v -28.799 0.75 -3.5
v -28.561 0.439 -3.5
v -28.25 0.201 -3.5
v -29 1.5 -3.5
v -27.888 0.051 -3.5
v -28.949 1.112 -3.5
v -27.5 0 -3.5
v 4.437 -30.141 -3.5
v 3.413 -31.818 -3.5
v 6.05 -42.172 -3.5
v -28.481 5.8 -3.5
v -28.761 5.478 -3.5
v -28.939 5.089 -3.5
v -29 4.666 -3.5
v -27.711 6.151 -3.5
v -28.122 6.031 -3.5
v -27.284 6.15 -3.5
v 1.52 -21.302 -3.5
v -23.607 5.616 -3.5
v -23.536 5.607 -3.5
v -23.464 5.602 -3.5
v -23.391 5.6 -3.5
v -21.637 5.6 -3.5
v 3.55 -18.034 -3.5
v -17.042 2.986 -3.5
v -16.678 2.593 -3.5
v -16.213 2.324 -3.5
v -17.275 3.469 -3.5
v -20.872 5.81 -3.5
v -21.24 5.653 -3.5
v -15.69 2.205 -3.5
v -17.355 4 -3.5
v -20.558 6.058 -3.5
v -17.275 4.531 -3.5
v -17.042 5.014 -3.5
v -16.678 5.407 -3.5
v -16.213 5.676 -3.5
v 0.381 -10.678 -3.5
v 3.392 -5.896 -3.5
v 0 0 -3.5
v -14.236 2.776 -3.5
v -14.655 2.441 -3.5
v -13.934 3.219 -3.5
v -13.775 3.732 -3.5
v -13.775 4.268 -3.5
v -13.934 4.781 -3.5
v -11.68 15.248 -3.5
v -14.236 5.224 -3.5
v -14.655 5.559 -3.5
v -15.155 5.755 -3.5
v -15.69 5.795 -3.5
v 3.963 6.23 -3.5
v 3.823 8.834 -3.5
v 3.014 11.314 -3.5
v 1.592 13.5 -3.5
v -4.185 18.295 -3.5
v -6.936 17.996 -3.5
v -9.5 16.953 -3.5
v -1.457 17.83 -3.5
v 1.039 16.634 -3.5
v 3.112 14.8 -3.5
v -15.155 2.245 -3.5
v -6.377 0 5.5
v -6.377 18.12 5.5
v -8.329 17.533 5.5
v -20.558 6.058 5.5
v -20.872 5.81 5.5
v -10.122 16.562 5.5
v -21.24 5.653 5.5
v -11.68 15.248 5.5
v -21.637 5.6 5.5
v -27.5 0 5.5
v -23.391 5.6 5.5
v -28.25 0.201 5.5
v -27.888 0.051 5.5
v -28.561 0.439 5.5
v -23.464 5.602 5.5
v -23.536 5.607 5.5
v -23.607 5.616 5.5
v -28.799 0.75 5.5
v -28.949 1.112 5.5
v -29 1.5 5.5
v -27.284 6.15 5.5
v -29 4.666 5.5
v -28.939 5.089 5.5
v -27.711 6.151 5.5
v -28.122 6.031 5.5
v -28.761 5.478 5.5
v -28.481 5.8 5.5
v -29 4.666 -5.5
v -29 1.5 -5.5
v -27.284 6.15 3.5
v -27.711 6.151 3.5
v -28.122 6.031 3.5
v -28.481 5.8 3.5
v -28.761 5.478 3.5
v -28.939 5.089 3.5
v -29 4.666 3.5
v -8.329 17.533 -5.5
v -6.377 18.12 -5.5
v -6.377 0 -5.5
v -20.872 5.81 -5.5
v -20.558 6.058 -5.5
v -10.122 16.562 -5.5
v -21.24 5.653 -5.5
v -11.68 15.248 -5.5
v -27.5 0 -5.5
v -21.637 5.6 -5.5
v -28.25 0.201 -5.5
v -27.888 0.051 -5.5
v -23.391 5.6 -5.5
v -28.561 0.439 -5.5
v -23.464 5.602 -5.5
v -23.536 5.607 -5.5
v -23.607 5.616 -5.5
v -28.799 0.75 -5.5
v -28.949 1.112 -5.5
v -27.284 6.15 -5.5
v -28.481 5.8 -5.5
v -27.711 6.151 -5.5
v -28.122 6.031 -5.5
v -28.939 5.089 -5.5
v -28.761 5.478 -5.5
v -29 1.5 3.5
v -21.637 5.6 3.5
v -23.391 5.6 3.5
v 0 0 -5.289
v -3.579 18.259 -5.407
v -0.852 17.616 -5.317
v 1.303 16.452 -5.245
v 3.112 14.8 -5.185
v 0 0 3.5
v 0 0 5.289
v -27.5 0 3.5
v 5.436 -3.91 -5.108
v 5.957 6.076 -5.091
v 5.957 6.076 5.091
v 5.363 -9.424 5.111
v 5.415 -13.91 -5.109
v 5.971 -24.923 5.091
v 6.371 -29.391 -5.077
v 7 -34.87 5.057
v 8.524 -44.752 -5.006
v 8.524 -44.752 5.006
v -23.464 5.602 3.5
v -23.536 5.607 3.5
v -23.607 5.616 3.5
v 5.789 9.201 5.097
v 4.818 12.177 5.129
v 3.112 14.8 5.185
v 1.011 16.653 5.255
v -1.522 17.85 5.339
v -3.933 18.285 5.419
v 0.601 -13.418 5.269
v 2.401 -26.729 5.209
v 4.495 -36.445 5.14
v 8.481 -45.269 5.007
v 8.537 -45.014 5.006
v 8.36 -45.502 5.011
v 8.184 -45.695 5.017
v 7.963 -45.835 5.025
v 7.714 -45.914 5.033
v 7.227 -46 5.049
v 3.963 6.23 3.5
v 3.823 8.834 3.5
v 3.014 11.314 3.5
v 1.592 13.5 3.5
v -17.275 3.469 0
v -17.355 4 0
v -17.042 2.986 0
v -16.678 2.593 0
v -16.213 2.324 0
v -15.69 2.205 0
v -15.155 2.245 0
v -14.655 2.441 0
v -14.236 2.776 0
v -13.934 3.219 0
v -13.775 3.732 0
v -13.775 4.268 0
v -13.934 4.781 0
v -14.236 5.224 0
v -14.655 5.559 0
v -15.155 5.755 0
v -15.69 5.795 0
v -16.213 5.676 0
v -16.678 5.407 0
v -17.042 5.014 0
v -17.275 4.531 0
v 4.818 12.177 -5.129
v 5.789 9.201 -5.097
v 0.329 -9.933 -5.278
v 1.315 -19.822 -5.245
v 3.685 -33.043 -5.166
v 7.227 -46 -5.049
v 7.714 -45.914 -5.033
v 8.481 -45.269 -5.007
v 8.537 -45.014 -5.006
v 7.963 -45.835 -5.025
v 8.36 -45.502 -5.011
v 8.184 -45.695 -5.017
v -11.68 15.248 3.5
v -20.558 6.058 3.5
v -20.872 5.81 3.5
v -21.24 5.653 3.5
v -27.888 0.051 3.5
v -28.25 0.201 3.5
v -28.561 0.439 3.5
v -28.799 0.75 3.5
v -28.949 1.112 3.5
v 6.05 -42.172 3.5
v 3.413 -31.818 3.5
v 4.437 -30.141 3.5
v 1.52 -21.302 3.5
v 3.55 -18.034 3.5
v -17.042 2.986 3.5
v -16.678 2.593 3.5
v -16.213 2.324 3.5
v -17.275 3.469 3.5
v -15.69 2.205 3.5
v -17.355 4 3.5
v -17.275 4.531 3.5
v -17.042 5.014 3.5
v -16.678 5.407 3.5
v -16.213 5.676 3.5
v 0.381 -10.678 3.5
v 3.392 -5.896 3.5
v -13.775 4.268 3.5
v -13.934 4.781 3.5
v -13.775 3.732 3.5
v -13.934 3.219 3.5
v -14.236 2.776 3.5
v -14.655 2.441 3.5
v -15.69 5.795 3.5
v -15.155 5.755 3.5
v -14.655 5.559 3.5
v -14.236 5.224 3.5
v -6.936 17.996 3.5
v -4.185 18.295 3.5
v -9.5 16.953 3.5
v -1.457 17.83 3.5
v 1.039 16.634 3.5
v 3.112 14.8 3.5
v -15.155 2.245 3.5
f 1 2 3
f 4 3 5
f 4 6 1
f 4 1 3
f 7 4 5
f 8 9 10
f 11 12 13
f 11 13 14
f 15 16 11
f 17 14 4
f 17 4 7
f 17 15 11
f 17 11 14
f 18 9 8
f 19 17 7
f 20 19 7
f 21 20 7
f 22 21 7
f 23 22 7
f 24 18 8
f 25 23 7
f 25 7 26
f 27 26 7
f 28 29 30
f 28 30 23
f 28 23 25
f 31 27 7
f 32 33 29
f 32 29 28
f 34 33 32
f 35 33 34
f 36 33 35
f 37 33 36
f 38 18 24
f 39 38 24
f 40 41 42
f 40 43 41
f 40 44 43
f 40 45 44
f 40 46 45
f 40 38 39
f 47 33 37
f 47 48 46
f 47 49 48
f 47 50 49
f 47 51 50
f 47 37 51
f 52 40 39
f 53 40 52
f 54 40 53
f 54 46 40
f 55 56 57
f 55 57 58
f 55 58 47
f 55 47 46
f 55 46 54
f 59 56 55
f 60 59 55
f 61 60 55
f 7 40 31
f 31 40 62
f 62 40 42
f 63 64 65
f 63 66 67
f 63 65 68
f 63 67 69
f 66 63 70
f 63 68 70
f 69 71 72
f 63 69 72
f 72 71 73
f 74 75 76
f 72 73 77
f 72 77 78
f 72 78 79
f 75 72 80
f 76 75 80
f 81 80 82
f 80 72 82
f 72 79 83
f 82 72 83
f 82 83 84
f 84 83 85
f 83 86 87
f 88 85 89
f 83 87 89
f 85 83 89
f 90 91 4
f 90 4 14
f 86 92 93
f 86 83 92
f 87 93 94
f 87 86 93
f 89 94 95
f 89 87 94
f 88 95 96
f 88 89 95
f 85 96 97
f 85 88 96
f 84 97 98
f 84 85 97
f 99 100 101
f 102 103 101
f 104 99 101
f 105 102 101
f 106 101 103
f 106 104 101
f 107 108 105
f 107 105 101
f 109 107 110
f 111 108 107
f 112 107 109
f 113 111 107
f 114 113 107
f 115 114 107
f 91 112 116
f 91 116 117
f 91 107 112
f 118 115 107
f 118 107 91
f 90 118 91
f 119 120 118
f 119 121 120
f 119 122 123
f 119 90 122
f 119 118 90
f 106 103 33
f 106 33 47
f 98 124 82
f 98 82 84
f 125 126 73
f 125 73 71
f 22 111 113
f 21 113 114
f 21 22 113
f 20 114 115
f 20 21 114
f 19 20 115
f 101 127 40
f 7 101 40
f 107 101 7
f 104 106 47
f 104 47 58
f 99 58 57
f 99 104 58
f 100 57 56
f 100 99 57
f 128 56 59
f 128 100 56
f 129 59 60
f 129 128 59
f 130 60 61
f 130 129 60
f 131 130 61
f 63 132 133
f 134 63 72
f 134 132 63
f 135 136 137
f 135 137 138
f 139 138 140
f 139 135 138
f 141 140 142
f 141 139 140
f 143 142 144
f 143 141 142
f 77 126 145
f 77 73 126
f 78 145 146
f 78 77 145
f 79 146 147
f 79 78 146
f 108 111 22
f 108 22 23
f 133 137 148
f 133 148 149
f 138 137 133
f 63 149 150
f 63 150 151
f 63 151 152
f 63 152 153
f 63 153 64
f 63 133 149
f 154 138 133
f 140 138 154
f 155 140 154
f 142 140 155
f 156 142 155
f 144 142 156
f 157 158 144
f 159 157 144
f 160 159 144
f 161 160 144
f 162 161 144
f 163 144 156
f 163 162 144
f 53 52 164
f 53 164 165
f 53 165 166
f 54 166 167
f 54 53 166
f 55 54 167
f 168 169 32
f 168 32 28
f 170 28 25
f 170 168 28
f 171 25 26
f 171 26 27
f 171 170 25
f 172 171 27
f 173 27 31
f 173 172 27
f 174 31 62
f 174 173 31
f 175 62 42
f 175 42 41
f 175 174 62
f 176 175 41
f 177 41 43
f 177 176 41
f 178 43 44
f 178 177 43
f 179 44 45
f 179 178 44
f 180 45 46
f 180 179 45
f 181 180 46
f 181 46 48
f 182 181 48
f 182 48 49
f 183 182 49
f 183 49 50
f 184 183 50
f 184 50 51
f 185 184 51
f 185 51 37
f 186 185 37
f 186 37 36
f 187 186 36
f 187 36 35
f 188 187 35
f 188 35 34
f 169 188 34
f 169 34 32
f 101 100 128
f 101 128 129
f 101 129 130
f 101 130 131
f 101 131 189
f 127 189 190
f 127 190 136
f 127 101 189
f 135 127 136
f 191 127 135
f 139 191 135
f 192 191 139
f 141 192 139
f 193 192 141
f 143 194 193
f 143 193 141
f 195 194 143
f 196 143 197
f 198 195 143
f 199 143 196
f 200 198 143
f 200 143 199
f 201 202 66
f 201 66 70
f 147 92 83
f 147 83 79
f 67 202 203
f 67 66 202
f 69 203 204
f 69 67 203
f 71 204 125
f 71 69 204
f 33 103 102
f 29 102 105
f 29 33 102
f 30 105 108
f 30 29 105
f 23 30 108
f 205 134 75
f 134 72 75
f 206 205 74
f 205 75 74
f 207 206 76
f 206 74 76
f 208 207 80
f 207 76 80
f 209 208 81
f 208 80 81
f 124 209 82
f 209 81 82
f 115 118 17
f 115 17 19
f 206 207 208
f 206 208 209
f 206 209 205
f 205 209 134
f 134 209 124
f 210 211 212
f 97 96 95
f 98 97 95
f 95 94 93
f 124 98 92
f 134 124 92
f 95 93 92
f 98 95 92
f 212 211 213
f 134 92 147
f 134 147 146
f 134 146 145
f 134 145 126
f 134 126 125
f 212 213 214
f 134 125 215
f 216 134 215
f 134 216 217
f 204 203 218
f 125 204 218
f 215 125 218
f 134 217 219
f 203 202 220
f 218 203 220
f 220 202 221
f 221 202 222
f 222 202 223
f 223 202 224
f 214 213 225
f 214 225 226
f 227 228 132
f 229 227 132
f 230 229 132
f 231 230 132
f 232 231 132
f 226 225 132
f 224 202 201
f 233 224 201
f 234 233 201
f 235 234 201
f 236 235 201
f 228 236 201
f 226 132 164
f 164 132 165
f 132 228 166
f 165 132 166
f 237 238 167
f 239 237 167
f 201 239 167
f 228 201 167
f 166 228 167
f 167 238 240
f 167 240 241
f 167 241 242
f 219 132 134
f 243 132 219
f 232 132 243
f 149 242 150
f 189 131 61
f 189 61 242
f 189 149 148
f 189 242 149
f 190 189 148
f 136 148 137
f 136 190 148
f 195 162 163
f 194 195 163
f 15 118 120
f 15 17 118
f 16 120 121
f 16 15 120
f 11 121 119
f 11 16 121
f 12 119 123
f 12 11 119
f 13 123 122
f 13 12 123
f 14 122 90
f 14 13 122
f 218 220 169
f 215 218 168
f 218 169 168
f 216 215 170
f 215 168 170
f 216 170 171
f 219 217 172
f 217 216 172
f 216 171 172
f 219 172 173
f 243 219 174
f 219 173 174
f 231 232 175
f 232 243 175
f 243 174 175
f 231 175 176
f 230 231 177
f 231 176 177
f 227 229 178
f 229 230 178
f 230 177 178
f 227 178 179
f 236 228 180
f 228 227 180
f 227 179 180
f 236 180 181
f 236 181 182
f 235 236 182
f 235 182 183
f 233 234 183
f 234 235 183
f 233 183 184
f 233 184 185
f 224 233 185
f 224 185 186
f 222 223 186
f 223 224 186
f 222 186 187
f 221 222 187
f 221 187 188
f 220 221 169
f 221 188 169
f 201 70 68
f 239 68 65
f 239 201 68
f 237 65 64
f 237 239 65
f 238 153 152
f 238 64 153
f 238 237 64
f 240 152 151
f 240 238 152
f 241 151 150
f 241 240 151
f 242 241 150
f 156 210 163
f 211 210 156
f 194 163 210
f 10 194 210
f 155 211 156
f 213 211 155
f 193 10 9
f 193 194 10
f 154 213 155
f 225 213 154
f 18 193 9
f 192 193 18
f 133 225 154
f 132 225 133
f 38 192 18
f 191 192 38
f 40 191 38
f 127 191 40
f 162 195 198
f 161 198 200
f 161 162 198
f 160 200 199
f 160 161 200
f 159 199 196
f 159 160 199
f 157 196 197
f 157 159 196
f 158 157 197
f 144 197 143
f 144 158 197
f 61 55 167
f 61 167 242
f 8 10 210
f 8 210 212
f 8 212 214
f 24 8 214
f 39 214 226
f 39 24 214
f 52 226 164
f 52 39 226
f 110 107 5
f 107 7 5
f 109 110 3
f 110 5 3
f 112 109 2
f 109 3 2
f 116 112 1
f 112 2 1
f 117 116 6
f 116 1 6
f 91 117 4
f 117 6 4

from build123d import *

# Parameters (mm, degrees)
BOSS_EXTRUDE1_DEPTH             = 5.5
BOSS_EXTRUDE1_DEPTH_BACK        = 5.5
SHELL4_START                    = -3.5
SHELL4_DEPTH                    = 7
CUT_EXTRUDE1_DEPTH              = 55.655740778
CUT_EXTRUDE1_DEPTH_BACK         = 55.655740778
SKETCH2_W                       = 69.221398806
SKETCH2_H                       = 30.475534722
BOSS_EXTRUDE2_REACH             = 56.656
SKETCH3_R                       = 1.8
BOSS_EXTRUDE2_DIRECTION_2_REACH = 56.656
FILLET1_R                       = 1.5
FILLET2_R                       = 1


# Read off the part's stored shape, not the designer's step: Shell4
with BuildPart() as part:
    # Sketch1 → Boss-Extrude1 (new, two sides: drawn at the far end of the back side and taken through both)
    with BuildSketch(Plane.XY.offset(-BOSS_EXTRUDE1_DEPTH_BACK)):
        with BuildLine():
            Line((0, 0), (-29, 0))
            Line((-29, 0), (-29, 6.4))
            Line((-29, 6.4), (-23.5, 5.6))
            Line((-23.5, 5.6), (-21, 5.6))
            Line((-21, 5.6), (-11.679922193, 15.24784279))
            ThreePointArc((-11.679922193, 15.24784279), (-4.185109089, 18.295419669), (3.11160179, 14.8))
            ThreePointArc((3.11160179, 14.8), (5.40105274, 10.720543521), (5.956739646, 6.07567938))
            ThreePointArc((5.956739646, 6.07567938), (5.643205462, -19.921417521), (8.704665249, -45.739527733))
            Line((8.704665249, -45.739527733), (7.227453619, -46))
            ThreePointArc((7.227453619, -46), (1.817879019, -23.282161013), (0, 0))
        make_face()
    extrude(amount=BOSS_EXTRUDE1_DEPTH + BOSS_EXTRUDE1_DEPTH_BACK)

    # Shell4 outline → Shell4 (cut)
    with BuildSketch(Plane.XY.offset(SHELL4_START)):
        with BuildLine():
            Line((1.591733374, 13.5), (3.11160179, 14.8))
            ThreePointArc((3.11160179, 14.8), (-4.185109088, 18.295419669), (-11.679922193, 15.24784279))
            Line((-11.679922193, 15.24784279), (-21, 5.6))
            Line((-21, 5.6), (-23.5, 5.6))
            Line((-23.5, 5.6), (-29, 6.4))
            Line((-29, 6.4), (-29, 0))
            Line((-29, 0), (0, 0))
            ThreePointArc((0, 0), (1.520272061, -21.301887027), (6.050271879, -42.171978539))
            ThreePointArc((6.050271879, -42.171978539), (3.550168012, -18.033934193), (3.962681588, 6.229732817))
            ThreePointArc((3.962681588, 6.229732817), (3.499609166, 10.100452934), (1.591733374, 13.5))
        make_face()
    extrude(amount=SHELL4_DEPTH, mode=Mode.SUBTRACT)

    # Sketch2 → Cut-Extrude1 (cut, two sides: drawn at the far end of the back side and taken through both)
    with BuildSketch(Plane(origin=(0, 0, 0), x_dir=(1, 0, 0), z_dir=(0, 1, 0)).offset(-CUT_EXTRUDE1_DEPTH_BACK)):
        Rectangle(SKETCH2_W, SKETCH2_H)
        Polygon((-29, 6.25), (8.704665249, 5), (8.704665249, -5), (-29, -6.25), align=None, mode=Mode.SUBTRACT)
    extrude(amount=CUT_EXTRUDE1_DEPTH + CUT_EXTRUDE1_DEPTH_BACK, mode=Mode.SUBTRACT)

    # Boss-Extrude2: up to this face of the body (flat: up to its plane)
    boss_extrude2_end = Plane(part.part.faces().sort_by_distance((-7.261638812, 3.224340324, 3.5))[0])
    # Sketch3 → Boss-Extrude2 (add, up to the picked face)
    with BuildSketch(Plane.XY, mode=Mode.PRIVATE) as boss_extrude2_sk1:
        with Locations(Location((-15.555262484, 4, 0), (0, 0, 180))):
            Circle(SKETCH3_R)
    boss_extrude2_tool1 = split(extrude(boss_extrude2_sk1.sketch, amount=BOSS_EXTRUDE2_REACH, mode=Mode.PRIVATE), bisect_by=boss_extrude2_end, keep=Keep.BOTH, mode=Mode.PRIVATE)
    add(boss_extrude2_tool1.solids().sort_by(Axis((-15.555262, 4, 0), (0, 0, 1)))[0])

    # Boss-Extrude2 direction 2: up to this face of the body (flat: up to its plane)
    boss_extrude2_direction_2_end = Plane(part.part.faces().sort_by_distance((-7.261638812, 3.224340324, -3.5))[0])
    # Sketch3 → Boss-Extrude2 direction 2 (add, up to the picked face)
    with BuildSketch(Plane.XY, mode=Mode.PRIVATE) as boss_extrude2_direction_2_sk1:
        with Locations(Location((-15.555262484, 4, 0), (0, 0, 180))):
            Circle(SKETCH3_R)
    boss_extrude2_direction_2_tool1 = split(extrude(boss_extrude2_direction_2_sk1.sketch, amount=-BOSS_EXTRUDE2_DIRECTION_2_REACH, mode=Mode.PRIVATE), bisect_by=boss_extrude2_direction_2_end, keep=Keep.BOTH, mode=Mode.PRIVATE)
    add(boss_extrude2_direction_2_tool1.solids().sort_by(Axis((-15.555262, 4, 0), (0, 0, -1)))[0])

    # Fillet1
    fillet1_edges = [part.edges().sort_by_distance(p)[0] for p in [
        (-29, 0, -4.5),
        (-29, 6.4, -4.5),
        (-23.5, 5.6, -4.5),
        (-21, 5.6, -4.5),
        (-21, 5.6, 4.5),
        (-23.5, 5.6, 4.5),
        (-29, 6.4, 4.5),
        (-29, 0, 4.5),
    ]]
    fillet(fillet1_edges, radius=FILLET1_R)

    # Fillet2
    fillet2_edges = [part.edges().sort_by_distance(p)[0] for p in [
        (8.704665249, -45.739527733, 0),
    ]]
    fillet(fillet2_edges, radius=FILLET2_R)


solid = part.part
